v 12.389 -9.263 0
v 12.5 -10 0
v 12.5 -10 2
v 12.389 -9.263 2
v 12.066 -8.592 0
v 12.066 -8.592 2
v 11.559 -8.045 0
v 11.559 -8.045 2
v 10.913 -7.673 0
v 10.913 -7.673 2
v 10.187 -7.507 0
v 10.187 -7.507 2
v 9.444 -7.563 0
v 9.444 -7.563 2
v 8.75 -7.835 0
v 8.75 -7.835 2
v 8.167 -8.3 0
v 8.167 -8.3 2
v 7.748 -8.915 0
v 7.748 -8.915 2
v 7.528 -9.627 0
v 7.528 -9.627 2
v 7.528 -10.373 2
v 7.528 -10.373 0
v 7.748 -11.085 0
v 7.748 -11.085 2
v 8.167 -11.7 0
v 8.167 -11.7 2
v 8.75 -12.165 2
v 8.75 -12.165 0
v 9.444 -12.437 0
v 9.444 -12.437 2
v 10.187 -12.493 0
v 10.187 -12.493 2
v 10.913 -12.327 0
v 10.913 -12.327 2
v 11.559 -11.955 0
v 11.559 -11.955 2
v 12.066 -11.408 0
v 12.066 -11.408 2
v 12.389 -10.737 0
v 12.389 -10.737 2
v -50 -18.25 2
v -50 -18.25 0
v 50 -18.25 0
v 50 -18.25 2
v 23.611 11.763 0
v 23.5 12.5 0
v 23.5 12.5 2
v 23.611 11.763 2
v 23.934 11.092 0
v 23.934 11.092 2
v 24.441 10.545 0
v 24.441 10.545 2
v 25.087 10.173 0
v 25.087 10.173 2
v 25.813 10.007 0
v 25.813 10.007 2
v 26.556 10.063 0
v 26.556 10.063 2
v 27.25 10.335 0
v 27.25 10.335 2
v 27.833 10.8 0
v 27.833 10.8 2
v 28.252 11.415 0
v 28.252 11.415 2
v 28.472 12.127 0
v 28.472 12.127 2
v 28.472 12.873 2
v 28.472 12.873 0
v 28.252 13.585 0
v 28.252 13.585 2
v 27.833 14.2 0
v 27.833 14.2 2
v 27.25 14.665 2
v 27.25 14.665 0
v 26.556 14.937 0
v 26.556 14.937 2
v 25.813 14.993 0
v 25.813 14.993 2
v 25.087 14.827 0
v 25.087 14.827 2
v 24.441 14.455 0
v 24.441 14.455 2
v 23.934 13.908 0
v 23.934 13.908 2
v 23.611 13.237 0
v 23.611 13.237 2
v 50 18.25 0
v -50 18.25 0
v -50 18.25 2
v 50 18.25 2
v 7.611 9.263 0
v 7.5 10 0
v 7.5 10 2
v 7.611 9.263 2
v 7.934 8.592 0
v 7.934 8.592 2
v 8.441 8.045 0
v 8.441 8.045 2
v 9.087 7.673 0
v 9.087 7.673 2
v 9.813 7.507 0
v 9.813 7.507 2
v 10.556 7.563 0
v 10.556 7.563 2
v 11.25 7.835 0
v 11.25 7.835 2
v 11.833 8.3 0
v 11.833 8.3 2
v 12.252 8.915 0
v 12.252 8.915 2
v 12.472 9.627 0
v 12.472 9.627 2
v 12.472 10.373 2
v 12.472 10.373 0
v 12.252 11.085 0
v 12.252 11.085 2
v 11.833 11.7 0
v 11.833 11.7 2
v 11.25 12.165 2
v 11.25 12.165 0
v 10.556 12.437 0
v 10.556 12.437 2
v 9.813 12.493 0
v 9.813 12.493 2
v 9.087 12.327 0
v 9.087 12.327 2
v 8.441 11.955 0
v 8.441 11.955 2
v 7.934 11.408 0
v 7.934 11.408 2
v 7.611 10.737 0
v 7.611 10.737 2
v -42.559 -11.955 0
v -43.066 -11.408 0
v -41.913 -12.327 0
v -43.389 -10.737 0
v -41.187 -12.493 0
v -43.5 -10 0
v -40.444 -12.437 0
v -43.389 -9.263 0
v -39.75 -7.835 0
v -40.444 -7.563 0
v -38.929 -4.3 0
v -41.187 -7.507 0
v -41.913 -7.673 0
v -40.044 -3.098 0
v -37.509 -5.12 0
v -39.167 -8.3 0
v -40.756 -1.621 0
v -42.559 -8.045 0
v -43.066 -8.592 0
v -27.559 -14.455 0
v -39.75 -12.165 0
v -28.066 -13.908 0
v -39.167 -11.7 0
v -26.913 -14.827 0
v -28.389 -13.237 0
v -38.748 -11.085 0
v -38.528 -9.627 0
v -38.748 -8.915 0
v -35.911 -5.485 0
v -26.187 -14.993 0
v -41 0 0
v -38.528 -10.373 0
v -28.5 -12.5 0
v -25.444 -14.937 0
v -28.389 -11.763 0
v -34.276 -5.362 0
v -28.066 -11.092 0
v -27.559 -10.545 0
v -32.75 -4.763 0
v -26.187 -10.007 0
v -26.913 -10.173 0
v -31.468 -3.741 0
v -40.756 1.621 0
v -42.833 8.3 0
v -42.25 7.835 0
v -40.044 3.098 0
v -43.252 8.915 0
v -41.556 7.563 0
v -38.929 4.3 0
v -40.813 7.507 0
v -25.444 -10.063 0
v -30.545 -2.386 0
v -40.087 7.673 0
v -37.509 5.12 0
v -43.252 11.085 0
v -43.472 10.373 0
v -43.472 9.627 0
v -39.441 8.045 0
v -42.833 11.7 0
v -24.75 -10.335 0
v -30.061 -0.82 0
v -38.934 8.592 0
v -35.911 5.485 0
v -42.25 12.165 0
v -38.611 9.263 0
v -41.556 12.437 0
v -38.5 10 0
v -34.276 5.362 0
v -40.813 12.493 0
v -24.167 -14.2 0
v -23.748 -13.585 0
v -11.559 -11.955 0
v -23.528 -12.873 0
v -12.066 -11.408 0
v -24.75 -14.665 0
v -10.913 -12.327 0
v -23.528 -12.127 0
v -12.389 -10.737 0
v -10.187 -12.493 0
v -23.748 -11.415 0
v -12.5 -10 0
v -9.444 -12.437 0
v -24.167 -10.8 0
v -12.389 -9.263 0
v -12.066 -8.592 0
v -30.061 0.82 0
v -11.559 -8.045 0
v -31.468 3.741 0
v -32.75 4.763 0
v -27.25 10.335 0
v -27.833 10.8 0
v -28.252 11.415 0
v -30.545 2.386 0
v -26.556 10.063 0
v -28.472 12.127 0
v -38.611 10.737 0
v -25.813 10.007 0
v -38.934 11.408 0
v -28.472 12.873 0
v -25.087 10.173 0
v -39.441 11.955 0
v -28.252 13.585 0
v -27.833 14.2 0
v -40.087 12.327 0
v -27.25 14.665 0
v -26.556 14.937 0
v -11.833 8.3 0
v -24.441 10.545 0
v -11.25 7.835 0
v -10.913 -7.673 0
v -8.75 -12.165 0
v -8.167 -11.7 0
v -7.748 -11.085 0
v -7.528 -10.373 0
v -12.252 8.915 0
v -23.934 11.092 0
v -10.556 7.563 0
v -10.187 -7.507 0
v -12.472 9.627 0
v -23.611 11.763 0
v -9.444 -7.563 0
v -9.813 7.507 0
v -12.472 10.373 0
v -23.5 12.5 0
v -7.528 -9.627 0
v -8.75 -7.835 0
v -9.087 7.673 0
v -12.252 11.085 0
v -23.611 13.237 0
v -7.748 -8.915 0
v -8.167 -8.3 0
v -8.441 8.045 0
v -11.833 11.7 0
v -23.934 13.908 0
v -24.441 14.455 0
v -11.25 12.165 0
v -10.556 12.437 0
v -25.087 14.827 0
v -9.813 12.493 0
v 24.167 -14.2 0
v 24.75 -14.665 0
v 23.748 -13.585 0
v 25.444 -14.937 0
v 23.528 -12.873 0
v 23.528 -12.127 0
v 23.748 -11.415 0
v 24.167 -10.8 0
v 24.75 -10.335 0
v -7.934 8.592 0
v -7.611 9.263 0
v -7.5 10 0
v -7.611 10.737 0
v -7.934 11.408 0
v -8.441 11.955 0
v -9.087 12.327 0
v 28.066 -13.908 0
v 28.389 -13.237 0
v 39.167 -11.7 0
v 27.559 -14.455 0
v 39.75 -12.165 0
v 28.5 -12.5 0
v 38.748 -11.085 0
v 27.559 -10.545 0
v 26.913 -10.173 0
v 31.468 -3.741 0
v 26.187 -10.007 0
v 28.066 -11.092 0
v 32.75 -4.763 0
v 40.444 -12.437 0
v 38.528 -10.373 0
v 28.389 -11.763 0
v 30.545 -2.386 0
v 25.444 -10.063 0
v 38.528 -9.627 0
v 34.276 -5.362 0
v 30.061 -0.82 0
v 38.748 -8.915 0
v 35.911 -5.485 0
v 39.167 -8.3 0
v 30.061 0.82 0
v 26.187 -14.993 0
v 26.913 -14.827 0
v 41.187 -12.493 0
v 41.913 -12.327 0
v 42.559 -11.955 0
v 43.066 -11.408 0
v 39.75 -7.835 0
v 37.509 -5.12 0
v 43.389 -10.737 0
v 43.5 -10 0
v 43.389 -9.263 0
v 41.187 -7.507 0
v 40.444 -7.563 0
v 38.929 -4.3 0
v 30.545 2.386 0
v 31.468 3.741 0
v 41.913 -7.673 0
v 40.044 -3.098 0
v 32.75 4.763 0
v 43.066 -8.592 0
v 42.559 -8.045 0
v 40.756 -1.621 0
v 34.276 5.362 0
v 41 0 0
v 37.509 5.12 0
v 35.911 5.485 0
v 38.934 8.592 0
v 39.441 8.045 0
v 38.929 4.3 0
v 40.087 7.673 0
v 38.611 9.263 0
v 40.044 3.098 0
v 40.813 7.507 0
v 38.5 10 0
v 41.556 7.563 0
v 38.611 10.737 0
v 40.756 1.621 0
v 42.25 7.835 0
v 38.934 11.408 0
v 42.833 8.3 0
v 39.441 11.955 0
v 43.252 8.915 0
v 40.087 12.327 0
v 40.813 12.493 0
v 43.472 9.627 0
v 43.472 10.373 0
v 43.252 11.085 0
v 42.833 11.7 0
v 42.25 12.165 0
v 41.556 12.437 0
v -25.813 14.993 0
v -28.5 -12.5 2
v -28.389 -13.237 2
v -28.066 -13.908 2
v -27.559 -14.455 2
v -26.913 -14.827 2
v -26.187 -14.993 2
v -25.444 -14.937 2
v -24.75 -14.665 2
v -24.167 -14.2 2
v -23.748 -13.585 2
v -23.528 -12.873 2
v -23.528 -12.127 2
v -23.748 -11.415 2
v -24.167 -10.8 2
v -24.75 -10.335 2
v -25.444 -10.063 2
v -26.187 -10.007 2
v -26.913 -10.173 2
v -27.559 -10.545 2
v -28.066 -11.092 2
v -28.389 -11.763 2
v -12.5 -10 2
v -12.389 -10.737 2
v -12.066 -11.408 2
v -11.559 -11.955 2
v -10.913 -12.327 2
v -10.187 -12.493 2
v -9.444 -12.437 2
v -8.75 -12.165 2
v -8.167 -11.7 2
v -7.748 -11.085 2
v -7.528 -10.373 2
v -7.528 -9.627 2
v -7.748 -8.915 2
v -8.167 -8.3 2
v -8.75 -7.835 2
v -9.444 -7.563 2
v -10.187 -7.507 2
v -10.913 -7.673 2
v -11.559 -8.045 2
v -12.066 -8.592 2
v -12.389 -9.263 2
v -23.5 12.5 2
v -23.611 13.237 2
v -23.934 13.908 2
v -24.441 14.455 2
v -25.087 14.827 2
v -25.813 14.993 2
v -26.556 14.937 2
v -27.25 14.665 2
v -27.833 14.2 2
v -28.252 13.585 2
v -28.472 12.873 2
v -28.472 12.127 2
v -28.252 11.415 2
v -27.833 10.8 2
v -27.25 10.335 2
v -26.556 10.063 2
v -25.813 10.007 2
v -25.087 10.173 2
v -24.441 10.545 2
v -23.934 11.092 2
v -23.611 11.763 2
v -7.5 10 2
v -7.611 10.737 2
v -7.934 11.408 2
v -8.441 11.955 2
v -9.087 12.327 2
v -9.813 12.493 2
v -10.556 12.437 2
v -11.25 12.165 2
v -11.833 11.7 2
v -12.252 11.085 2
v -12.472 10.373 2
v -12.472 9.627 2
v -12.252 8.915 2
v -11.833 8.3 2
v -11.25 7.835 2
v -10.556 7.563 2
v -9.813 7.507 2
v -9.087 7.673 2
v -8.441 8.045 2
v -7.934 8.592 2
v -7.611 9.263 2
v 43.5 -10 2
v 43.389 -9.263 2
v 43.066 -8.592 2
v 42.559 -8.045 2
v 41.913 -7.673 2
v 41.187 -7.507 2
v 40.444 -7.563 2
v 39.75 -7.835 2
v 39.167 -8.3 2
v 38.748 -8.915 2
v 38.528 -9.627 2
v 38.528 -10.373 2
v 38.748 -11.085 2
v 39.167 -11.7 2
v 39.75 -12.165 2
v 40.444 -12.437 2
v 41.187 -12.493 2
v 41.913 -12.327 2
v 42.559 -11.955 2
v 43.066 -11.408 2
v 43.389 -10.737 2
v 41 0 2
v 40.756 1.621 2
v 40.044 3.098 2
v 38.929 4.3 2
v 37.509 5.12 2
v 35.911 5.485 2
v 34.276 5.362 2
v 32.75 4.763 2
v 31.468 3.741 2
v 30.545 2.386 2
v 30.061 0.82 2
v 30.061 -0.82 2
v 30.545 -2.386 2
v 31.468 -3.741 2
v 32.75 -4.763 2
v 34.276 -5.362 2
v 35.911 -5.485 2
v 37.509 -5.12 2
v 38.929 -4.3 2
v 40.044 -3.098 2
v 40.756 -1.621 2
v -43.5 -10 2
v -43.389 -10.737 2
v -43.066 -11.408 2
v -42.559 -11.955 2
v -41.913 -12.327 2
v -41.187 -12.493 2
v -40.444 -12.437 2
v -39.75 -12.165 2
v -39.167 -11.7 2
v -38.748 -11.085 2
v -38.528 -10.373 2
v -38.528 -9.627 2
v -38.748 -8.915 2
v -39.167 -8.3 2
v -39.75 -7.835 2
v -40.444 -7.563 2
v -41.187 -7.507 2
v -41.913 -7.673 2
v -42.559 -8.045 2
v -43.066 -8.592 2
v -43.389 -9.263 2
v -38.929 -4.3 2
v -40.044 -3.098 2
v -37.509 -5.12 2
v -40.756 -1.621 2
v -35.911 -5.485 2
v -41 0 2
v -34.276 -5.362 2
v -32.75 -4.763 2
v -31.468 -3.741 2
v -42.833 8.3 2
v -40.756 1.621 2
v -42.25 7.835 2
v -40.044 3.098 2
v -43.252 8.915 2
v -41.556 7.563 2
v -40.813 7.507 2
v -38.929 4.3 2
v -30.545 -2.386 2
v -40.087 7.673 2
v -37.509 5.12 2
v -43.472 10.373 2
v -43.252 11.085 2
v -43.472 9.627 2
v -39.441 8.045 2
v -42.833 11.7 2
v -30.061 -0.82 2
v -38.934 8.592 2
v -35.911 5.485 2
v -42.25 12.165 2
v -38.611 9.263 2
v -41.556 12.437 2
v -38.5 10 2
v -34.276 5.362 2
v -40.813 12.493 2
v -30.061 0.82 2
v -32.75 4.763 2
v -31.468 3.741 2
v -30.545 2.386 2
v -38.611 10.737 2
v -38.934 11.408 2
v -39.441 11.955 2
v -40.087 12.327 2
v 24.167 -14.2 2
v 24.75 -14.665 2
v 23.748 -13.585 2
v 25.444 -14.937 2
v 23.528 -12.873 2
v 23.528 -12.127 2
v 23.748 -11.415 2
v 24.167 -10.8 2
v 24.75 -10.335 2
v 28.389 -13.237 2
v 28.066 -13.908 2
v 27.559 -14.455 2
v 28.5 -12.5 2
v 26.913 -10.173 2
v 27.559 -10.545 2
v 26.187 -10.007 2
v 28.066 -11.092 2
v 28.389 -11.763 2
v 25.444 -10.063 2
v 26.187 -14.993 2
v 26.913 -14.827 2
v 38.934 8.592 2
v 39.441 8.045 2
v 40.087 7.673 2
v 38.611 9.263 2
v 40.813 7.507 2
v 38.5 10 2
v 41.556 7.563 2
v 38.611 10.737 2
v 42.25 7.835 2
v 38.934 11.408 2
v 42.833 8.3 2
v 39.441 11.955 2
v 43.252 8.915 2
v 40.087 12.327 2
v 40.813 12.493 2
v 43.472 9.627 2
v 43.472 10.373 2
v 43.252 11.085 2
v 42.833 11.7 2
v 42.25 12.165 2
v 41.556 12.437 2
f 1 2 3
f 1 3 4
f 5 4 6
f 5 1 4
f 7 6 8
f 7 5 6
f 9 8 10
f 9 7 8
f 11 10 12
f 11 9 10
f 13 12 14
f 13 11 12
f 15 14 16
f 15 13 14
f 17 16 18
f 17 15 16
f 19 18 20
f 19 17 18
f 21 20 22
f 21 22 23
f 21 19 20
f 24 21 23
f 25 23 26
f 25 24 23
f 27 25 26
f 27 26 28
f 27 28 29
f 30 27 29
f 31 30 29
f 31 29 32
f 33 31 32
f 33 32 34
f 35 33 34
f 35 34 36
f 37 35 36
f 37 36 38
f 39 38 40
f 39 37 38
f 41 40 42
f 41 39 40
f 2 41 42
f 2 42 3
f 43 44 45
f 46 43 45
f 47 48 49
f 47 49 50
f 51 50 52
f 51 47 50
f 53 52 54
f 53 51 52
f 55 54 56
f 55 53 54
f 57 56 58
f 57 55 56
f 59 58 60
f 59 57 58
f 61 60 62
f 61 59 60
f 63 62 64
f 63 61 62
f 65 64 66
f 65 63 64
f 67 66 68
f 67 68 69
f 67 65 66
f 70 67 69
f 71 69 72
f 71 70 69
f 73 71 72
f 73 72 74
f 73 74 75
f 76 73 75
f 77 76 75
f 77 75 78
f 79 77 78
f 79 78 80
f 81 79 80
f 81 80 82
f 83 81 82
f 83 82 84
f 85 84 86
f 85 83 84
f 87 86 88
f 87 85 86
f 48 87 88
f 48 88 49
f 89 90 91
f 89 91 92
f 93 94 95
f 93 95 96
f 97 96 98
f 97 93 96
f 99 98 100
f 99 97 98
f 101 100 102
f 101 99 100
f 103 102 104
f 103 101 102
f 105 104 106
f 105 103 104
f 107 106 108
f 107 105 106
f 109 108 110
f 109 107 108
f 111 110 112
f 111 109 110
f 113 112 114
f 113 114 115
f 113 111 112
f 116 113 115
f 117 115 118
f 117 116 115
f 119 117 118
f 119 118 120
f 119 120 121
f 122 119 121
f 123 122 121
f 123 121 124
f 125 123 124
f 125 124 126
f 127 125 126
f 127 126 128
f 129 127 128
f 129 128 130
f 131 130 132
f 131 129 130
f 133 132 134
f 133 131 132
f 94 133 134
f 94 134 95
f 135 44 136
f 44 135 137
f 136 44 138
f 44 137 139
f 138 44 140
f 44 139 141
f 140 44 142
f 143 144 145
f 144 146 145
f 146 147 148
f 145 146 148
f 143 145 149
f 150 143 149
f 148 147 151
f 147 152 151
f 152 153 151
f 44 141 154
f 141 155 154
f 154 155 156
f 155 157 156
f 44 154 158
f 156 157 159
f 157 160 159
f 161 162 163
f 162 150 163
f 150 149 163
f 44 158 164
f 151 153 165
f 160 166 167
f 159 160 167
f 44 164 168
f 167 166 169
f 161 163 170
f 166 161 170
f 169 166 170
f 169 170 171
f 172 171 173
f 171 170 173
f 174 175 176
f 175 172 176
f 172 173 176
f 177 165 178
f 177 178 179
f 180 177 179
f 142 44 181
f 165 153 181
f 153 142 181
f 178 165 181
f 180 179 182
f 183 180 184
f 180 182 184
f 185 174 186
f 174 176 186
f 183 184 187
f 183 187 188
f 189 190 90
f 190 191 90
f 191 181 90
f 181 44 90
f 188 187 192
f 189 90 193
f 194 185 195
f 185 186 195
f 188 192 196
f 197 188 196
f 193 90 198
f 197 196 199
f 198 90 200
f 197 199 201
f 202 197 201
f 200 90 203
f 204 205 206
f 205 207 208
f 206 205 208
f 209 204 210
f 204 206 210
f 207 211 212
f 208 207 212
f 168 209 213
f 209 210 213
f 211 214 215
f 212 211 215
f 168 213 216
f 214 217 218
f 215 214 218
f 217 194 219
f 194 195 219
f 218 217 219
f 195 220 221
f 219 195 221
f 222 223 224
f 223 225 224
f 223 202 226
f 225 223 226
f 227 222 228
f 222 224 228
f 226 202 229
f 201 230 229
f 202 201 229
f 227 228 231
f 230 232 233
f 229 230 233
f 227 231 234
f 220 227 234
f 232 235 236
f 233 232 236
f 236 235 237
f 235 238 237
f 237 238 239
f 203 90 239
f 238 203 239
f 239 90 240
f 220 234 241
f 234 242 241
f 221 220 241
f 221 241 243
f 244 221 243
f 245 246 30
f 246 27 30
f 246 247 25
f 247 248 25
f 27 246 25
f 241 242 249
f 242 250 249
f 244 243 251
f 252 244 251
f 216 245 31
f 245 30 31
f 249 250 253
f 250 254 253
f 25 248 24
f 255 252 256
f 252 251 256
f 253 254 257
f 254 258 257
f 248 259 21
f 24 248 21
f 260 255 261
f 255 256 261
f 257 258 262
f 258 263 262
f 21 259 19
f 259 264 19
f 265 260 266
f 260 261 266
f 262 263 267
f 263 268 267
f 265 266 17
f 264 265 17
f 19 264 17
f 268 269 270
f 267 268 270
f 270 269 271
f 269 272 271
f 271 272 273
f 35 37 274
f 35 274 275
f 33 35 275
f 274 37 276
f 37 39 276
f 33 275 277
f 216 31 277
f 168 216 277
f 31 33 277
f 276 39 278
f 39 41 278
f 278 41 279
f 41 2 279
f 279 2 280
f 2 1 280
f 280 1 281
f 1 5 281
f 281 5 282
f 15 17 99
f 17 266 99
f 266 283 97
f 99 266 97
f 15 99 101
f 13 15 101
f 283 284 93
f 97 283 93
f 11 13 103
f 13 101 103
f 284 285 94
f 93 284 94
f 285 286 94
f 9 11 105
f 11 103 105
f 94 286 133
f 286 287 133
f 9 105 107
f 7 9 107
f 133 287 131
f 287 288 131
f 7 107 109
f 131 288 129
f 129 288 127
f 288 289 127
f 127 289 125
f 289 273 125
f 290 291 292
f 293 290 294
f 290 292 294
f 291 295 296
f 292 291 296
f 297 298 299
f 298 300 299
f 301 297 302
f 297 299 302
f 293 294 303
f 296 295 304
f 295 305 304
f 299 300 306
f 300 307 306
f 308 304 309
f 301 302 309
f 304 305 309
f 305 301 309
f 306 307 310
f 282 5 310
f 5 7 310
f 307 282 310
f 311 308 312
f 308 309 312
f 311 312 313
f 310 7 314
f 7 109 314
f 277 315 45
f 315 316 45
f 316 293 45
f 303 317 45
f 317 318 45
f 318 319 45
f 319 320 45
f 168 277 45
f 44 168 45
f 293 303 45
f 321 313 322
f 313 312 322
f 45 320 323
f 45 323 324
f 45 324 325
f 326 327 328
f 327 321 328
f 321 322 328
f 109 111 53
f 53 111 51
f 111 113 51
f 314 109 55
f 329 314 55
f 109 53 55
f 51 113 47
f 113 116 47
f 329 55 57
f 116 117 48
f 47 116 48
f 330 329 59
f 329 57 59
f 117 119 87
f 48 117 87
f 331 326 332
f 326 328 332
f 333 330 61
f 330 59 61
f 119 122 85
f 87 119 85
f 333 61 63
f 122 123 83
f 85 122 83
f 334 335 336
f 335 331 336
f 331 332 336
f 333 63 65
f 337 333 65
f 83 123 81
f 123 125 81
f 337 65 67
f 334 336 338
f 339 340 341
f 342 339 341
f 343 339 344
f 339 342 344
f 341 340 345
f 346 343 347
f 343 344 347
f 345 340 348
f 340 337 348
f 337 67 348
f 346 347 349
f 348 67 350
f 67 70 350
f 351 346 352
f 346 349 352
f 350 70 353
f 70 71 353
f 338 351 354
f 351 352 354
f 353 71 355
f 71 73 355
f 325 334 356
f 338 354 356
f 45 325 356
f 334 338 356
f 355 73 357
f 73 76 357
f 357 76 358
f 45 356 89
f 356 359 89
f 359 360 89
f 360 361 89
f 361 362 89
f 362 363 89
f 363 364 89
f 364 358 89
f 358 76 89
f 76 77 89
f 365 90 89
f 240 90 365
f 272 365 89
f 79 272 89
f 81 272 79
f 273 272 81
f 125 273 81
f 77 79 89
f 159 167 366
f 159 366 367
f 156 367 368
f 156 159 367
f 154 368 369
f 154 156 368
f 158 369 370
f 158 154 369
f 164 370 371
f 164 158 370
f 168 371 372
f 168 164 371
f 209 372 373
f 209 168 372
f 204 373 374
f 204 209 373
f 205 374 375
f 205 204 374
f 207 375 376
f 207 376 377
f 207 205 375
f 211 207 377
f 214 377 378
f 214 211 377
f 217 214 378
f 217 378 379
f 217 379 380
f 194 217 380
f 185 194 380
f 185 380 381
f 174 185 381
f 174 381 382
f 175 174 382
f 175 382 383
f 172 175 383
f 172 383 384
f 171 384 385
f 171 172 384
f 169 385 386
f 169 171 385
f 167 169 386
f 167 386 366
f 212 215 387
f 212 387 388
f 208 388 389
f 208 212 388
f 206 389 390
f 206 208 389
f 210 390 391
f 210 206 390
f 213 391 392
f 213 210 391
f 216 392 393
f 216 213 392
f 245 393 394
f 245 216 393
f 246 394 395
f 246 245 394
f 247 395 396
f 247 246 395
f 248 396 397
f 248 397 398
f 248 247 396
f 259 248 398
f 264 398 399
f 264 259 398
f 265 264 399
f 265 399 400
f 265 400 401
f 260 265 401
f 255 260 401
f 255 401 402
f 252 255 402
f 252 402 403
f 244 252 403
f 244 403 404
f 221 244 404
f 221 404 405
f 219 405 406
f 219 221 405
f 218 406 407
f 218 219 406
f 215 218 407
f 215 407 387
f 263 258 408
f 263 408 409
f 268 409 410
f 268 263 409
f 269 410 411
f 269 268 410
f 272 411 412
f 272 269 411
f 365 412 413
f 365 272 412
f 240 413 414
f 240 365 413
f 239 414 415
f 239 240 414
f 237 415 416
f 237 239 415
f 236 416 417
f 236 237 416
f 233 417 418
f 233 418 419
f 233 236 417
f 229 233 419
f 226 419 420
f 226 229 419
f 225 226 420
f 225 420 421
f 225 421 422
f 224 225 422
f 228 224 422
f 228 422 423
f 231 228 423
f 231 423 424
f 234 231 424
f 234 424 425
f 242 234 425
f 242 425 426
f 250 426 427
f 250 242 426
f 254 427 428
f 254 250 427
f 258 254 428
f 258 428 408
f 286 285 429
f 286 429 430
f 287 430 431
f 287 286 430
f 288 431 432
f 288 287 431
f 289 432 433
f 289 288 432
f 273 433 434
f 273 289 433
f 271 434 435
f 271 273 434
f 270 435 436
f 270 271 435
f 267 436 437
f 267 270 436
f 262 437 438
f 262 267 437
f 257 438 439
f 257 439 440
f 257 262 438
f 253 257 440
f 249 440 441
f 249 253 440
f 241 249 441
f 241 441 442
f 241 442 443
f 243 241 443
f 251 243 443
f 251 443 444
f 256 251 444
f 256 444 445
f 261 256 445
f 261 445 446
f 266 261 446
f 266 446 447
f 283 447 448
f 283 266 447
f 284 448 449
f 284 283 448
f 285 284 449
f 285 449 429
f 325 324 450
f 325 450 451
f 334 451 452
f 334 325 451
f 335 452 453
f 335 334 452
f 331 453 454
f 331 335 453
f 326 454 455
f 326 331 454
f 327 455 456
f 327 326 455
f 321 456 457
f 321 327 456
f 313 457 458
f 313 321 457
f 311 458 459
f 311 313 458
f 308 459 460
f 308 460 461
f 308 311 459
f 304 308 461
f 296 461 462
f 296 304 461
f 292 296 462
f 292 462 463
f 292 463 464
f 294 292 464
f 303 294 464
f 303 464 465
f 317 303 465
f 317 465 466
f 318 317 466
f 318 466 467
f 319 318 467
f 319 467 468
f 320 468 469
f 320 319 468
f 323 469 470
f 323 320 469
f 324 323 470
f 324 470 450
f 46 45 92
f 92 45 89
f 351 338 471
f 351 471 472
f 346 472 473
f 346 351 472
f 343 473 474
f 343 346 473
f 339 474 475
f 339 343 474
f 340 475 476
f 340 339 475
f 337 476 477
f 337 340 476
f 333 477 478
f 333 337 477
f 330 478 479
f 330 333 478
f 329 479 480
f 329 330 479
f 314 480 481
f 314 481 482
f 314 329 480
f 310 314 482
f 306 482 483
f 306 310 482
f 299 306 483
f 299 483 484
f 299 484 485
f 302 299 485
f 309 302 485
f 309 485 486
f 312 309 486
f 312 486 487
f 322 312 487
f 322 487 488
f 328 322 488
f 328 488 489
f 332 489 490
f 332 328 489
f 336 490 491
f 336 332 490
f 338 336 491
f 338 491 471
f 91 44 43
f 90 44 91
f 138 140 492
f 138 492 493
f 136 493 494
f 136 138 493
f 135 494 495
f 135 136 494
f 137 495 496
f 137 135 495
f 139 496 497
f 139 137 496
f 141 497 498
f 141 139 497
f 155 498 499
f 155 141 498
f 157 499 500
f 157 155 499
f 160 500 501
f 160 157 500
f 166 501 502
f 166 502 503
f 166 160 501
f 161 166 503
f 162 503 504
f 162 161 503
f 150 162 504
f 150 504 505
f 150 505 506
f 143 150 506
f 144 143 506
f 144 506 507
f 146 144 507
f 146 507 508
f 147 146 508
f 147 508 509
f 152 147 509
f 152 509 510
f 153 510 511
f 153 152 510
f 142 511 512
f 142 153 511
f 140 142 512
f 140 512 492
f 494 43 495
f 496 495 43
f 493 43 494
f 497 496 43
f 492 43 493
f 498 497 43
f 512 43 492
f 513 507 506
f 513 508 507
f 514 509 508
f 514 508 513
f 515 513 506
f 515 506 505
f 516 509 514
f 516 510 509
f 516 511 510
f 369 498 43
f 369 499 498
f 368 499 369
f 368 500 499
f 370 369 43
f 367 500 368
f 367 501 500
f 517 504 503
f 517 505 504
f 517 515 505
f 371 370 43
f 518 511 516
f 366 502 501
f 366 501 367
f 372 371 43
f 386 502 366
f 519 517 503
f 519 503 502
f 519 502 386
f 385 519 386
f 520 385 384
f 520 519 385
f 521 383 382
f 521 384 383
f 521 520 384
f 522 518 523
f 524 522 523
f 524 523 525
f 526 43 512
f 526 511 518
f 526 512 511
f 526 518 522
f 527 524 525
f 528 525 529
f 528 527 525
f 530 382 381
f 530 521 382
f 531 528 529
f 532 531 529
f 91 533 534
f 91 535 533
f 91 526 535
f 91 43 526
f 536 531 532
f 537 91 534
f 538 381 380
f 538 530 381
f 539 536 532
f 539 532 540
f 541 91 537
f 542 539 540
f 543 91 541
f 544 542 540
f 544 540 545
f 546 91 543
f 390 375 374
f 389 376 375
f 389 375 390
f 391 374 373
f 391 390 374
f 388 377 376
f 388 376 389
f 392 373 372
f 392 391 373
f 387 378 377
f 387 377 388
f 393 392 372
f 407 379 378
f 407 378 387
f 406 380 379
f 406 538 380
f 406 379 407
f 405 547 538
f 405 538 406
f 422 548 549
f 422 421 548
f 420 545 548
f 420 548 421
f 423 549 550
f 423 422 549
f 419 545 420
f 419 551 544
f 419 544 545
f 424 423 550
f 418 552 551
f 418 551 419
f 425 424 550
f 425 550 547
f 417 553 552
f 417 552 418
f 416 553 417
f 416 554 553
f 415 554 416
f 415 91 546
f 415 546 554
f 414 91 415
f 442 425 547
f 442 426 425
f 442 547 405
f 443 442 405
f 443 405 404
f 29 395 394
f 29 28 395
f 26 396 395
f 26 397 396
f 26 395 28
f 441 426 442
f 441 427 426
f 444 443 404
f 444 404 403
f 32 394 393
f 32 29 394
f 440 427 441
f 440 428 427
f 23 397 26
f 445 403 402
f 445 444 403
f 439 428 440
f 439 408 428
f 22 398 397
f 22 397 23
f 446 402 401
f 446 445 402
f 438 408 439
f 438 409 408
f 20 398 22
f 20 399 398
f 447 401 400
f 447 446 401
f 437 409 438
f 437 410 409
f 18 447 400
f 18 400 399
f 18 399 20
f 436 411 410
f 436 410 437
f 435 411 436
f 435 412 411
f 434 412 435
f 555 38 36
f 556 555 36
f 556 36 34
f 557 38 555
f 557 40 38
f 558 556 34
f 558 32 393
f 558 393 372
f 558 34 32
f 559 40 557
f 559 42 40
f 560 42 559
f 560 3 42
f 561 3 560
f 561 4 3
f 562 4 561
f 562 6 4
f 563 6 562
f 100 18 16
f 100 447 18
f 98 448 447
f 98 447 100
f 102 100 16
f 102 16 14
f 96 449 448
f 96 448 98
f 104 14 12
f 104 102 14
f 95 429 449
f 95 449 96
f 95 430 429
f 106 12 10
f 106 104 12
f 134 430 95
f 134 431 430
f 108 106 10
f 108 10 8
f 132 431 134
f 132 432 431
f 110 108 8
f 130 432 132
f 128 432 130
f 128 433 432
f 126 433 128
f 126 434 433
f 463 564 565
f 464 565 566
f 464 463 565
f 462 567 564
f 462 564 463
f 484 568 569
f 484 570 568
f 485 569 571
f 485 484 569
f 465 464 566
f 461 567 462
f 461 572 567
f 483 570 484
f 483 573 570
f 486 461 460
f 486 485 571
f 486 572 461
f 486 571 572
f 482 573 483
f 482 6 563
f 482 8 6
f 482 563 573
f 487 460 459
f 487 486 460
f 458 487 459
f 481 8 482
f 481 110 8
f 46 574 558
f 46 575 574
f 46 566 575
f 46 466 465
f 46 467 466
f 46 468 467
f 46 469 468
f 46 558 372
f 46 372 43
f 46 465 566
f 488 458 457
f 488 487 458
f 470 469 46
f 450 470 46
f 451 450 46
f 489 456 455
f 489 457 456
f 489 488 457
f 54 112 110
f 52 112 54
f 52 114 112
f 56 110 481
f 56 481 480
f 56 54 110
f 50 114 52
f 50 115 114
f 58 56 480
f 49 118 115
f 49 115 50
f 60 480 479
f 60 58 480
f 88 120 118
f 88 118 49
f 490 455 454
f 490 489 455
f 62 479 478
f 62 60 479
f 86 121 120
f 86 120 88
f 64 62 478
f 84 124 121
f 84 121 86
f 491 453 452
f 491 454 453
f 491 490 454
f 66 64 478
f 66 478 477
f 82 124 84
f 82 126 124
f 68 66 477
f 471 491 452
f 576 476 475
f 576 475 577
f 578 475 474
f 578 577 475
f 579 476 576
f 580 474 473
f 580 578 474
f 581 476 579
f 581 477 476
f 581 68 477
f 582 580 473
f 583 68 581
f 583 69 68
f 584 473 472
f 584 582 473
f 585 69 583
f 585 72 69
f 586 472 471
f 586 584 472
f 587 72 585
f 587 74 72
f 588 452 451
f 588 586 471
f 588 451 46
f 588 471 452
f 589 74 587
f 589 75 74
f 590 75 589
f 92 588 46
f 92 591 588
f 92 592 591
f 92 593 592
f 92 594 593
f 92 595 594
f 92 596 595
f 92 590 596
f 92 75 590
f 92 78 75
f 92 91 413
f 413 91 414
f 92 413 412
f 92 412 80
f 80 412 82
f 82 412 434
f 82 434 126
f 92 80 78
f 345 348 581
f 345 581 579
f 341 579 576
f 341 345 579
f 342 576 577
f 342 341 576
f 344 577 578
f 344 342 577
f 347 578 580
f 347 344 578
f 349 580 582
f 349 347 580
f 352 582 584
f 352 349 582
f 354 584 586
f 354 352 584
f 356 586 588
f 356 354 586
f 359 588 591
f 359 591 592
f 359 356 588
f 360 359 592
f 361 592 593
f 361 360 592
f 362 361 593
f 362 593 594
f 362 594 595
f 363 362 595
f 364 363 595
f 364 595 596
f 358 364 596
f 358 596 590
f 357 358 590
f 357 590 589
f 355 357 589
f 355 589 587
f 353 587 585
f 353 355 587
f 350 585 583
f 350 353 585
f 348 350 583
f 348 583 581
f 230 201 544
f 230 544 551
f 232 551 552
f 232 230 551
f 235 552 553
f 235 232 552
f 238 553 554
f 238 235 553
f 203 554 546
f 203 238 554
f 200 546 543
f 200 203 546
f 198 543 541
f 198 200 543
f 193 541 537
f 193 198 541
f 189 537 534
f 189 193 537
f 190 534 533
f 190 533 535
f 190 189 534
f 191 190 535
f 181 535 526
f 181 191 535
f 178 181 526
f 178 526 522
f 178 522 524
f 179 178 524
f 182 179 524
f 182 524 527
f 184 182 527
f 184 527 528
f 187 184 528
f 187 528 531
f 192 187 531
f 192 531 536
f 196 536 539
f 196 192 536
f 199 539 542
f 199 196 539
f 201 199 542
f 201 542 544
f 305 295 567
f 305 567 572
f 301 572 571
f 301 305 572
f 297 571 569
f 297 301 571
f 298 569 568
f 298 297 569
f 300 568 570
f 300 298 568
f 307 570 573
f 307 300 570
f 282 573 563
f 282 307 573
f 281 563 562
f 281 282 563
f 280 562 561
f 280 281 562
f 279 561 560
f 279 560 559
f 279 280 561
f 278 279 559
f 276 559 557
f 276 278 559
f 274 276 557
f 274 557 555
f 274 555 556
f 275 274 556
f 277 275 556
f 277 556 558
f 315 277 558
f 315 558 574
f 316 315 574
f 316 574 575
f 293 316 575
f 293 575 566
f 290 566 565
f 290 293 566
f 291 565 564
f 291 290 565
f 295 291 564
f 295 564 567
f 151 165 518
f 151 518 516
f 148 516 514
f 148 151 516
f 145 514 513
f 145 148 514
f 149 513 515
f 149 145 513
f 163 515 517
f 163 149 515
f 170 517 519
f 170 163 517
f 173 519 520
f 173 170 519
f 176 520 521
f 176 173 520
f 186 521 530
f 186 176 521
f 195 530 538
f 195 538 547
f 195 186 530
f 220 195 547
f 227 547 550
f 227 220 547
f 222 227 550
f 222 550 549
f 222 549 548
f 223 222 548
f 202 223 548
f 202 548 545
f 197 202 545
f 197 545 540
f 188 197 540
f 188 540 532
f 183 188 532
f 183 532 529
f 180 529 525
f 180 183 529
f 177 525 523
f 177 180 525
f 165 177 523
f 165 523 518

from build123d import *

# Parameters (mm, degrees)
SKETCH_1_W      = 100
SKETCH_1_H      = 36.5
SKETCH_1_R      = 5.5
SKETCH_1_R_2    = 2.5
EXTRUDE_1_DEPTH = 2


with BuildPart() as part:
    # Эскиз1 → Вытянуть1 (new body)
    with BuildSketch(Plane.XY):
        Rectangle(SKETCH_1_W, SKETCH_1_H)
        with Locations((35.5, 0)):
            Circle(SKETCH_1_R, mode=Mode.SUBTRACT)
        with Locations(Location((-35.5, 0, 0), (0, 0, 180))):
            Circle(SKETCH_1_R, mode=Mode.SUBTRACT)
        with Locations((-41, 10)):
            Circle(SKETCH_1_R_2, mode=Mode.SUBTRACT)
        with Locations((-26, 12.5)):
            Circle(SKETCH_1_R_2, mode=Mode.SUBTRACT)
        with Locations((-10, 10)):
            Circle(SKETCH_1_R_2, mode=Mode.SUBTRACT)
        with Locations(Location((-10, -10, 0), (0, 0, 180))):
            Circle(SKETCH_1_R_2, mode=Mode.SUBTRACT)
        with Locations(Location((-26, -12.5, 0), (0, 0, 180))):
            Circle(SKETCH_1_R_2, mode=Mode.SUBTRACT)
        with Locations(Location((-41, -10, 0), (0, 0, 180))):
            Circle(SKETCH_1_R_2, mode=Mode.SUBTRACT)
        with Locations(Location((10, 10, 0), (0, 0, 180))):
            Circle(SKETCH_1_R_2, mode=Mode.SUBTRACT)
        with Locations((10, -10)):
            Circle(SKETCH_1_R_2, mode=Mode.SUBTRACT)
        with Locations((26, -12.5)):
            Circle(SKETCH_1_R_2, mode=Mode.SUBTRACT)
        with Locations(Location((26, 12.5, 0), (0, 0, 180))):
            Circle(SKETCH_1_R_2, mode=Mode.SUBTRACT)
        with Locations(Location((41, 10, 0), (0, 0, 180))):
            Circle(SKETCH_1_R_2, mode=Mode.SUBTRACT)
        with Locations((41, -10)):
            Circle(SKETCH_1_R_2, mode=Mode.SUBTRACT)
    extrude(amount=EXTRUDE_1_DEPTH)


solid = part.part
